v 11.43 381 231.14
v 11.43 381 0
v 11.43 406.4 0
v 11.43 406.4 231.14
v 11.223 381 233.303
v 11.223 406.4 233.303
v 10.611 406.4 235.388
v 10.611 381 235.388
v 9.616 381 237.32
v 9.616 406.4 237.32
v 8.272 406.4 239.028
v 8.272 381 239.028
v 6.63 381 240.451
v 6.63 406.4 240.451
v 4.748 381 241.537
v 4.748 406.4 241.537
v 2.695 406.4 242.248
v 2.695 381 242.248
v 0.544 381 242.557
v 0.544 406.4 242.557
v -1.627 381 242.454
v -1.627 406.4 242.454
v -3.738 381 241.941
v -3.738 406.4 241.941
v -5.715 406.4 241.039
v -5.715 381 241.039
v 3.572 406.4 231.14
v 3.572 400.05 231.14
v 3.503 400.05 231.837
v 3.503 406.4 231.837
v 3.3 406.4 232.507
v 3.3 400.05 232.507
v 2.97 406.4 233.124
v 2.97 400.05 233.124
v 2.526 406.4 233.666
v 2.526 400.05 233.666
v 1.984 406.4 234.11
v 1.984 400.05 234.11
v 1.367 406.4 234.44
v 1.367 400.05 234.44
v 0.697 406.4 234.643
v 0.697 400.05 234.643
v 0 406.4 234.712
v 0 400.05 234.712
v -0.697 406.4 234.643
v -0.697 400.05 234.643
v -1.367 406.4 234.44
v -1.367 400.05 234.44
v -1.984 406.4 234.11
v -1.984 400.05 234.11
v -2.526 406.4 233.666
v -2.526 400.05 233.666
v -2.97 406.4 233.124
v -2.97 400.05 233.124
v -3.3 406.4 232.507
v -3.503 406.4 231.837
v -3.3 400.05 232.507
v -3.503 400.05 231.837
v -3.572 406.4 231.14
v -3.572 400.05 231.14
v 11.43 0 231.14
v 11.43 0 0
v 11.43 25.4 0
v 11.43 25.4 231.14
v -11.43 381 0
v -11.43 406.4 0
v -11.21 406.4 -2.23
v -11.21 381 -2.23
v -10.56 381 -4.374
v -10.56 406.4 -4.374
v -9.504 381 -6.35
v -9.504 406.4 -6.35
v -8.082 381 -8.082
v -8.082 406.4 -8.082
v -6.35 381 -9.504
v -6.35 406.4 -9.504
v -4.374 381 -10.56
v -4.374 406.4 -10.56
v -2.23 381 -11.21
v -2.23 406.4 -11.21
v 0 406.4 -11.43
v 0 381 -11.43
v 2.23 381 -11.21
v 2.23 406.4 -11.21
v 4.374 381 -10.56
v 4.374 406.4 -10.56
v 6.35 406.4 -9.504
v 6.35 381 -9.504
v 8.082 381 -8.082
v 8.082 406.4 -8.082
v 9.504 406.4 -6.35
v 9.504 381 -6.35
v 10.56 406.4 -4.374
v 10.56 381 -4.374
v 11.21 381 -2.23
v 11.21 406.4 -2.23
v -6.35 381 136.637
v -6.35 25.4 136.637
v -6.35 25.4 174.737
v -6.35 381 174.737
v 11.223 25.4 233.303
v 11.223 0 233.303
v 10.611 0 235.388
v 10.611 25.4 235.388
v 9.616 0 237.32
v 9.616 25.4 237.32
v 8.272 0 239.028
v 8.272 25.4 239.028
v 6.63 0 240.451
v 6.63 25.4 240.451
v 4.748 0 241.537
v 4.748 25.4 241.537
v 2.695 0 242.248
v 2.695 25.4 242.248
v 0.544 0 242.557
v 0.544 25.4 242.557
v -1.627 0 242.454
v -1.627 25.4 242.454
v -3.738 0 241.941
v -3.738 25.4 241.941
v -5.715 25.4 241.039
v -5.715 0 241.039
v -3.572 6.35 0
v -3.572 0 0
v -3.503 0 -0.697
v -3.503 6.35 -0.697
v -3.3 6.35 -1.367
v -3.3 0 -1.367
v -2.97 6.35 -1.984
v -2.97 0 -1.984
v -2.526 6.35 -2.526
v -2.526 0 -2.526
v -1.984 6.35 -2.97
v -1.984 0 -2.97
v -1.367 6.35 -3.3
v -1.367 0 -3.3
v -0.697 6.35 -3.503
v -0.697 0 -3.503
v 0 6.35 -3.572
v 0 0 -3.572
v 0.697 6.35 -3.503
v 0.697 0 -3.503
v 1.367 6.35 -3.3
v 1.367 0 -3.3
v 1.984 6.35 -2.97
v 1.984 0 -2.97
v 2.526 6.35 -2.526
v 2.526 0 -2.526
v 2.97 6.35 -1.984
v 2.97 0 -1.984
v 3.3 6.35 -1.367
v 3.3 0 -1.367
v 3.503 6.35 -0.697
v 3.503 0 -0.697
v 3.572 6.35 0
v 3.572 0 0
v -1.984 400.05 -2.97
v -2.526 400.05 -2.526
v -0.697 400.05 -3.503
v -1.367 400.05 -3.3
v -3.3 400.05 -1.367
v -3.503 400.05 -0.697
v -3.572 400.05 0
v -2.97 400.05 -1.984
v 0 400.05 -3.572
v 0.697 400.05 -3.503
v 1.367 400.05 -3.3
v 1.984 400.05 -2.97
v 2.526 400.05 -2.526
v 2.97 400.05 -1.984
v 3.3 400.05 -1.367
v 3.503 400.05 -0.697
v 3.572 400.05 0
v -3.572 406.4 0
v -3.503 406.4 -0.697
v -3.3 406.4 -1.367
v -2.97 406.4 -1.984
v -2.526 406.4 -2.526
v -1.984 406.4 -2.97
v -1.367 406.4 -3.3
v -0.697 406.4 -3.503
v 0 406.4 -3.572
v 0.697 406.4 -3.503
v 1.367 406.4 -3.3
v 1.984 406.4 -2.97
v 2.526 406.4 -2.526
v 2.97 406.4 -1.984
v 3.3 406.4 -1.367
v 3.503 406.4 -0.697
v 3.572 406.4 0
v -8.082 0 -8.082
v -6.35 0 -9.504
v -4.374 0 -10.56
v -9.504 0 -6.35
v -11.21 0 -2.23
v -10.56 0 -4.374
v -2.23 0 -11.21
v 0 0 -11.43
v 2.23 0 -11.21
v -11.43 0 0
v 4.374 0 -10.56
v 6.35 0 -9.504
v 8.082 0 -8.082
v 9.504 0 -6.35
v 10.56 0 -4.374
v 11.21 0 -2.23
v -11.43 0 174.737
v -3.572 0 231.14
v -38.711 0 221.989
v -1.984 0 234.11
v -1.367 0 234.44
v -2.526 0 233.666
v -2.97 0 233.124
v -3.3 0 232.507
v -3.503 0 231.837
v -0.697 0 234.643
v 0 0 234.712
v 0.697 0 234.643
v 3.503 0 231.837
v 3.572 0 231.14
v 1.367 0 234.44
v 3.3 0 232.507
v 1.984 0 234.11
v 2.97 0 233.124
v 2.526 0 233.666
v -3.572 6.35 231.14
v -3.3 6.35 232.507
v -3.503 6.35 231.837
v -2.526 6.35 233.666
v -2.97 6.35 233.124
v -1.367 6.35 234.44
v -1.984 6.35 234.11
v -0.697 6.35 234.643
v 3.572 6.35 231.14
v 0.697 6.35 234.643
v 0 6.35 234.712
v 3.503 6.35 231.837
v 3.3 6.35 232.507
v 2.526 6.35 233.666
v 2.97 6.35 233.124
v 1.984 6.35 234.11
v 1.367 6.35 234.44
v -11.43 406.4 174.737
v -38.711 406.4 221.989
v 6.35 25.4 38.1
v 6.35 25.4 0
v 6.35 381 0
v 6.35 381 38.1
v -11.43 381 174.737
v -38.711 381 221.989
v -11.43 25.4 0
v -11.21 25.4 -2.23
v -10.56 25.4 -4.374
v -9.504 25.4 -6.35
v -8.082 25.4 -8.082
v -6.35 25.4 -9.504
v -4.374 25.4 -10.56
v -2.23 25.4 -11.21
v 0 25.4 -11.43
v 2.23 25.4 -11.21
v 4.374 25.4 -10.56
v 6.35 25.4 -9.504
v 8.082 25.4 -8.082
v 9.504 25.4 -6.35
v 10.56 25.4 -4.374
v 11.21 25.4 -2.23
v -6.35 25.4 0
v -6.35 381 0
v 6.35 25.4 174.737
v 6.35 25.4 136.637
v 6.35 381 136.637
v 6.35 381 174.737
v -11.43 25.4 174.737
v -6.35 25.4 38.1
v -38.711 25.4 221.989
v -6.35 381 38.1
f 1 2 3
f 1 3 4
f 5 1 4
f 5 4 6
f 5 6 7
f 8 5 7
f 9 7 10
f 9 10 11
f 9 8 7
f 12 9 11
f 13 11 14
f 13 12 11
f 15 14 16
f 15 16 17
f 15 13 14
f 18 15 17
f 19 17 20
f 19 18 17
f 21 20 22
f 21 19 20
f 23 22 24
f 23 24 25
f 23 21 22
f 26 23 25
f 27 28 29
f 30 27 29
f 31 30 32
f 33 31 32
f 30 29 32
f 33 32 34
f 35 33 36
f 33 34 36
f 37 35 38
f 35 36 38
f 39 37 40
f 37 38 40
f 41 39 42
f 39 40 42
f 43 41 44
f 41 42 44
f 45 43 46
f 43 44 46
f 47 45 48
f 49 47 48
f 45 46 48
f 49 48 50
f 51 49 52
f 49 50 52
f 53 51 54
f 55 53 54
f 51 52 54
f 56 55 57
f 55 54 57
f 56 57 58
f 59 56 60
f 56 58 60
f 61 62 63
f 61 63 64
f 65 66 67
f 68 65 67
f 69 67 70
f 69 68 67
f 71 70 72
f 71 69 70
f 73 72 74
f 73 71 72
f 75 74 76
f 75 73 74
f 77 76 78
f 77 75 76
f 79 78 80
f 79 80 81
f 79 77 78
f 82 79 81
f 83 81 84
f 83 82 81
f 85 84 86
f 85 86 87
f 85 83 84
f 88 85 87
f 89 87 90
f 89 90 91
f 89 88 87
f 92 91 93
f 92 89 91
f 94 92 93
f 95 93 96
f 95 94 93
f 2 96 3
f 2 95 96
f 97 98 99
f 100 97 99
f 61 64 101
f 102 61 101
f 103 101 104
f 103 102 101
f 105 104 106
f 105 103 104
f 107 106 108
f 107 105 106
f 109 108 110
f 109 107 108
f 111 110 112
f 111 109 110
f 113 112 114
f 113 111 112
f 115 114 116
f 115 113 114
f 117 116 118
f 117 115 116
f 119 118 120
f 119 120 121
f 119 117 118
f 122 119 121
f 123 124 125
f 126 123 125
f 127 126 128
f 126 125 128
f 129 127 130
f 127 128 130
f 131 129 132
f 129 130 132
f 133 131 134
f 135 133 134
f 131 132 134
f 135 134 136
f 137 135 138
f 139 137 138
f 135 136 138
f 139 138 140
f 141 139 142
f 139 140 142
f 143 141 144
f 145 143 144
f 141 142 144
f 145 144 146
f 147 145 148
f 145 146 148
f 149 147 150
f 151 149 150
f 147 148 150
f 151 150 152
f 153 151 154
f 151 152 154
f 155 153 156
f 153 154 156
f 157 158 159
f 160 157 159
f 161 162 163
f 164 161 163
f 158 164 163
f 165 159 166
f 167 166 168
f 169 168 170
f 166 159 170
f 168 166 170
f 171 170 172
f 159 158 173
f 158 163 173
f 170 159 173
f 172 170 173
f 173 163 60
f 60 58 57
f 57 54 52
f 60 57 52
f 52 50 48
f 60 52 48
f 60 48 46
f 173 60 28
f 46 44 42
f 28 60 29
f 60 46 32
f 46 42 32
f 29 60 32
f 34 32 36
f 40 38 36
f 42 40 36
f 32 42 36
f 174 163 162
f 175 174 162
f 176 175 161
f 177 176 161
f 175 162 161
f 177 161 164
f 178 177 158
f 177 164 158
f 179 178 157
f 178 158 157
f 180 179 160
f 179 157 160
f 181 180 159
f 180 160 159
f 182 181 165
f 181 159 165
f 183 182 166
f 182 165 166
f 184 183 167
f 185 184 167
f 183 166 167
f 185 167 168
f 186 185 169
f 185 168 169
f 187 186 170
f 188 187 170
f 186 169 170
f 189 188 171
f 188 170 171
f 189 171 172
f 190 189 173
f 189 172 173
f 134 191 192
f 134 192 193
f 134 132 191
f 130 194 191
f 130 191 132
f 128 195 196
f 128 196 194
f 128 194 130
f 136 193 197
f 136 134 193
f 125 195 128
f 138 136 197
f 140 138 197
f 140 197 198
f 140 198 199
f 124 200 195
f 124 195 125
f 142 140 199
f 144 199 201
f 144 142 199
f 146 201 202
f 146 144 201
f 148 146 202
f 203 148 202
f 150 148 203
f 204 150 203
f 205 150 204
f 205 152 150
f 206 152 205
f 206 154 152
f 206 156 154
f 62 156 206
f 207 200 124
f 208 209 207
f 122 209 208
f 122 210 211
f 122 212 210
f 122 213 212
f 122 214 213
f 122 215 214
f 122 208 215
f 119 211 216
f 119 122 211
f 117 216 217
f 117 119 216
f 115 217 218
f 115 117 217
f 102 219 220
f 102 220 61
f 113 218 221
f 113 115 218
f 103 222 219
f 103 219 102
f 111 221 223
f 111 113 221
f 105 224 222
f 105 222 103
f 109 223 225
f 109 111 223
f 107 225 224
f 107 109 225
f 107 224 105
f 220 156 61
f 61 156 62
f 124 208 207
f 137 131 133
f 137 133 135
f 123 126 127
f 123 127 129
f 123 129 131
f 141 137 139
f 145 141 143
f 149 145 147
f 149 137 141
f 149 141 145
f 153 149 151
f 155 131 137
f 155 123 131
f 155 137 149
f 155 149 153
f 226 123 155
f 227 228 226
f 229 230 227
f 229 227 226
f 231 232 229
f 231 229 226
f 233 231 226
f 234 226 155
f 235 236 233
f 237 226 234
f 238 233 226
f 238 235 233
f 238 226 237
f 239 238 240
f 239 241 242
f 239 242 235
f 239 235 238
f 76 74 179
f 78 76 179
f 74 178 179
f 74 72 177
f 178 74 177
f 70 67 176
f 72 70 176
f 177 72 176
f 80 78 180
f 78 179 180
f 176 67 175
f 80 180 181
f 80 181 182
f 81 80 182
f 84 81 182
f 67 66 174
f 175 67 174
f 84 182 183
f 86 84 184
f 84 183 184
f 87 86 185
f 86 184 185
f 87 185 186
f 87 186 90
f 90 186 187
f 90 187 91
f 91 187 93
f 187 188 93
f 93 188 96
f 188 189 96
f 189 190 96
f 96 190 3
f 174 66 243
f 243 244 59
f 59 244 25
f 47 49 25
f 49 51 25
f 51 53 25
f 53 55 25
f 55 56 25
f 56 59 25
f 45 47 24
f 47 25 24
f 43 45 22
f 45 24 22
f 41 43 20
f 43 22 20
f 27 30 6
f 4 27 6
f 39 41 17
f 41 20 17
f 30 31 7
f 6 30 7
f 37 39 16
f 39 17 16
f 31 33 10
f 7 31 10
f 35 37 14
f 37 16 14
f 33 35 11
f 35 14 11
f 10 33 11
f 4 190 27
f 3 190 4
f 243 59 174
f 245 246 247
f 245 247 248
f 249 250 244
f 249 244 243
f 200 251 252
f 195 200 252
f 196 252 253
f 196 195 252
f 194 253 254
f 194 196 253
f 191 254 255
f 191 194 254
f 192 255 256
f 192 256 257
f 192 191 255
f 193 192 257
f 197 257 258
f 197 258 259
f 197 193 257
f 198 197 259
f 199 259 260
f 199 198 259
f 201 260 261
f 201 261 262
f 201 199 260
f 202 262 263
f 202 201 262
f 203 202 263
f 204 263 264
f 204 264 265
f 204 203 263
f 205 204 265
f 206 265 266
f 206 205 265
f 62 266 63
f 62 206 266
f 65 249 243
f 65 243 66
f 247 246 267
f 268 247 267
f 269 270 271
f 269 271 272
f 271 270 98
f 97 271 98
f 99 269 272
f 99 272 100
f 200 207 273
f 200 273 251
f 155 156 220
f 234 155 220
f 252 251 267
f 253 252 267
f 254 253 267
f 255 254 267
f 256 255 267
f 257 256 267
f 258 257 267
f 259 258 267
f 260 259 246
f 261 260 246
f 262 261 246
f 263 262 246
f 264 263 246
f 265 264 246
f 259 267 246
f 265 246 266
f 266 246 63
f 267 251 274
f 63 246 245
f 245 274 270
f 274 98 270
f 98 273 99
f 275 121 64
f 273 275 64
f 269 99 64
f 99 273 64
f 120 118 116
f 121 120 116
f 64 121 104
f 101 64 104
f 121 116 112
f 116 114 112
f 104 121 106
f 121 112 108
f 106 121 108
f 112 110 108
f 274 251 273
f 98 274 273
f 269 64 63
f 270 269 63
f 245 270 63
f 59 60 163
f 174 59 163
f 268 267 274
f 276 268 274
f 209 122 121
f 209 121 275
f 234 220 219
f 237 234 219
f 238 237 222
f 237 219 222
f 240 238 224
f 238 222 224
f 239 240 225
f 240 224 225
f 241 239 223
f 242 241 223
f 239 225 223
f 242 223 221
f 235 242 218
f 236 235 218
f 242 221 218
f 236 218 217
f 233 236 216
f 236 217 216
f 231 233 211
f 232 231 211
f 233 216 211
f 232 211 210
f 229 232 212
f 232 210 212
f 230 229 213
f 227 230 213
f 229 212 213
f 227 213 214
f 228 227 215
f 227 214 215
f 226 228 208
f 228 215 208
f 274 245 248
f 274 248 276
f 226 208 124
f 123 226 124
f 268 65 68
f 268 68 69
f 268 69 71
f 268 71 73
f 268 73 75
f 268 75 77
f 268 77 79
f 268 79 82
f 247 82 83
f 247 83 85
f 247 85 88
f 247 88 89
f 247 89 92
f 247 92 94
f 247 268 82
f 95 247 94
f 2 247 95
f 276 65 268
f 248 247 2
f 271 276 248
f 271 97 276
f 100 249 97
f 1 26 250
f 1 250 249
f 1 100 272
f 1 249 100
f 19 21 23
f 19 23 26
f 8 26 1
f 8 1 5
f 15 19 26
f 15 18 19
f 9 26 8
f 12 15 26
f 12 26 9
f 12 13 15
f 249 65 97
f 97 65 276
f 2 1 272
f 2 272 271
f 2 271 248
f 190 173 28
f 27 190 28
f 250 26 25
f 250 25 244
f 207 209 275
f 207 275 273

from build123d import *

# Parameters (mm, degrees)
F1_DEPTH      = 25.4
F2_START      = -381
F2_DEPTH      = 25.4
F3_W          = 12.7
F3_H          = 38.1
F4_DEPTH      = 361.95
F4_DEPTH_BACK = 6.35
F6_DEPTH      = 6.35
F7_START      = -400.05
F7_DEPTH      = 6.35


# Not quite as in the source:
# - a feature of the source that left no trace in its solid (it failed there, or was rolled back) is left out


with BuildPart() as f1:
    # F0 (on Front) → F1 (new body)
    with BuildSketch(Plane.XZ):
        with BuildLine():
            Line((-11.43, 174.7373407305), (-11.43, 0))
            ThreePointArc((-11.43, 0), (0, -11.43), (11.43, 0))
            Line((11.43, 0), (11.43, 231.14))
            ThreePointArc((11.43, 231.14), (5.715, 241.0386703653), (-5.715, 241.0386703653))
            Line((-5.715, 241.0386703653), (-38.7105678842, 221.9886703653))
            Line((-38.7105678842, 221.9886703653), (-11.43, 174.7373407305))
        make_face()
        with BuildLine():
            Line((-3.571875, 0), (-3.571875, 231.14))
            ThreePointArc((-3.571875, 231.14), (0, 234.711875), (3.571875, 231.14))
            Line((3.571875, 231.14), (3.571875, 0))
            ThreePointArc((3.571875, 0), (0, -3.571875), (-3.571875, 0))
        make_face(mode=Mode.SUBTRACT)
        with BuildLine():
            ThreePointArc((3.571875, 231.14), (0, 234.711875), (-3.571875, 231.14))
            Line((-3.571875, 231.14), (-3.571875, 0))
            ThreePointArc((-3.571875, 0), (0, -3.571875), (3.571875, 0))
            Line((3.571875, 0), (3.571875, 231.14))
        make_face()
    extrude(amount=-F1_DEPTH)



with BuildPart() as f2:
    # F0 (on Front) → F2 (new body)
    with BuildSketch(Plane.XZ.offset(F2_START)):
        with BuildLine():
            Line((-11.43, 174.7373407305), (-11.43, 0))
            ThreePointArc((-11.43, 0), (0, -11.43), (11.43, 0))
            Line((11.43, 0), (11.43, 231.14))
            ThreePointArc((11.43, 231.14), (5.715, 241.0386703653), (-5.715, 241.0386703653))
            Line((-5.715, 241.0386703653), (-38.7105678842, 221.9886703653))
            Line((-38.7105678842, 221.9886703653), (-11.43, 174.7373407305))
        make_face()
        with BuildLine():
            Line((-3.571875, 0), (-3.571875, 231.14))
            ThreePointArc((-3.571875, 231.14), (0, 234.711875), (3.571875, 231.14))
            Line((3.571875, 231.14), (3.571875, 0))
            ThreePointArc((3.571875, 0), (0, -3.571875), (-3.571875, 0))
        make_face(mode=Mode.SUBTRACT)
        with BuildLine():
            ThreePointArc((3.571875, 231.14), (0, 234.711875), (-3.571875, 231.14))
            Line((-3.571875, 231.14), (-3.571875, 0))
            ThreePointArc((-3.571875, 0), (0, -3.571875), (3.571875, 0))
            Line((3.571875, 0), (3.571875, 231.14))
        make_face()
    extrude(amount=-F2_DEPTH)


with BuildPart() as f1_1:
    add(f1.part)

    add(f2.part)  # F4 merges F2
    # F3 (on face) → F4 (join, two sides)
    with BuildSketch(Plane(origin=(0, 25.4, 0), x_dir=(-1, 0, 0), z_dir=(0, 1, 0))) as f4_sk:
        with Locations((0, 155.6873407305)):
            Rectangle(F3_W, F3_H)
        with Locations((0, 19.05)):
            Rectangle(F3_W, F3_H)
    extrude(amount=F4_DEPTH)
    extrude(f4_sk.sketch, amount=-F4_DEPTH_BACK)

    # F0 (on Front) → F6 (cut)
    with BuildSketch(Plane.XZ):
        with BuildLine():
            ThreePointArc((3.571875, 231.14), (0, 234.711875), (-3.571875, 231.14))
            Line((-3.571875, 231.14), (-3.571875, 0))
            ThreePointArc((-3.571875, 0), (0, -3.571875), (3.571875, 0))
            Line((3.571875, 0), (3.571875, 231.14))
        make_face()
    extrude(amount=-F6_DEPTH, mode=Mode.SUBTRACT)

    # F0 (on Front) → F7 (cut)
    with BuildSketch(Plane.XZ.offset(F7_START)):
        with BuildLine():
            ThreePointArc((3.571875, 231.14), (0, 234.711875), (-3.571875, 231.14))
            Line((-3.571875, 231.14), (-3.571875, 0))
            ThreePointArc((-3.571875, 0), (0, -3.571875), (3.571875, 0))
            Line((3.571875, 0), (3.571875, 231.14))
        make_face()
    extrude(amount=-F7_DEPTH, mode=Mode.SUBTRACT)


solid = f1_1.part
